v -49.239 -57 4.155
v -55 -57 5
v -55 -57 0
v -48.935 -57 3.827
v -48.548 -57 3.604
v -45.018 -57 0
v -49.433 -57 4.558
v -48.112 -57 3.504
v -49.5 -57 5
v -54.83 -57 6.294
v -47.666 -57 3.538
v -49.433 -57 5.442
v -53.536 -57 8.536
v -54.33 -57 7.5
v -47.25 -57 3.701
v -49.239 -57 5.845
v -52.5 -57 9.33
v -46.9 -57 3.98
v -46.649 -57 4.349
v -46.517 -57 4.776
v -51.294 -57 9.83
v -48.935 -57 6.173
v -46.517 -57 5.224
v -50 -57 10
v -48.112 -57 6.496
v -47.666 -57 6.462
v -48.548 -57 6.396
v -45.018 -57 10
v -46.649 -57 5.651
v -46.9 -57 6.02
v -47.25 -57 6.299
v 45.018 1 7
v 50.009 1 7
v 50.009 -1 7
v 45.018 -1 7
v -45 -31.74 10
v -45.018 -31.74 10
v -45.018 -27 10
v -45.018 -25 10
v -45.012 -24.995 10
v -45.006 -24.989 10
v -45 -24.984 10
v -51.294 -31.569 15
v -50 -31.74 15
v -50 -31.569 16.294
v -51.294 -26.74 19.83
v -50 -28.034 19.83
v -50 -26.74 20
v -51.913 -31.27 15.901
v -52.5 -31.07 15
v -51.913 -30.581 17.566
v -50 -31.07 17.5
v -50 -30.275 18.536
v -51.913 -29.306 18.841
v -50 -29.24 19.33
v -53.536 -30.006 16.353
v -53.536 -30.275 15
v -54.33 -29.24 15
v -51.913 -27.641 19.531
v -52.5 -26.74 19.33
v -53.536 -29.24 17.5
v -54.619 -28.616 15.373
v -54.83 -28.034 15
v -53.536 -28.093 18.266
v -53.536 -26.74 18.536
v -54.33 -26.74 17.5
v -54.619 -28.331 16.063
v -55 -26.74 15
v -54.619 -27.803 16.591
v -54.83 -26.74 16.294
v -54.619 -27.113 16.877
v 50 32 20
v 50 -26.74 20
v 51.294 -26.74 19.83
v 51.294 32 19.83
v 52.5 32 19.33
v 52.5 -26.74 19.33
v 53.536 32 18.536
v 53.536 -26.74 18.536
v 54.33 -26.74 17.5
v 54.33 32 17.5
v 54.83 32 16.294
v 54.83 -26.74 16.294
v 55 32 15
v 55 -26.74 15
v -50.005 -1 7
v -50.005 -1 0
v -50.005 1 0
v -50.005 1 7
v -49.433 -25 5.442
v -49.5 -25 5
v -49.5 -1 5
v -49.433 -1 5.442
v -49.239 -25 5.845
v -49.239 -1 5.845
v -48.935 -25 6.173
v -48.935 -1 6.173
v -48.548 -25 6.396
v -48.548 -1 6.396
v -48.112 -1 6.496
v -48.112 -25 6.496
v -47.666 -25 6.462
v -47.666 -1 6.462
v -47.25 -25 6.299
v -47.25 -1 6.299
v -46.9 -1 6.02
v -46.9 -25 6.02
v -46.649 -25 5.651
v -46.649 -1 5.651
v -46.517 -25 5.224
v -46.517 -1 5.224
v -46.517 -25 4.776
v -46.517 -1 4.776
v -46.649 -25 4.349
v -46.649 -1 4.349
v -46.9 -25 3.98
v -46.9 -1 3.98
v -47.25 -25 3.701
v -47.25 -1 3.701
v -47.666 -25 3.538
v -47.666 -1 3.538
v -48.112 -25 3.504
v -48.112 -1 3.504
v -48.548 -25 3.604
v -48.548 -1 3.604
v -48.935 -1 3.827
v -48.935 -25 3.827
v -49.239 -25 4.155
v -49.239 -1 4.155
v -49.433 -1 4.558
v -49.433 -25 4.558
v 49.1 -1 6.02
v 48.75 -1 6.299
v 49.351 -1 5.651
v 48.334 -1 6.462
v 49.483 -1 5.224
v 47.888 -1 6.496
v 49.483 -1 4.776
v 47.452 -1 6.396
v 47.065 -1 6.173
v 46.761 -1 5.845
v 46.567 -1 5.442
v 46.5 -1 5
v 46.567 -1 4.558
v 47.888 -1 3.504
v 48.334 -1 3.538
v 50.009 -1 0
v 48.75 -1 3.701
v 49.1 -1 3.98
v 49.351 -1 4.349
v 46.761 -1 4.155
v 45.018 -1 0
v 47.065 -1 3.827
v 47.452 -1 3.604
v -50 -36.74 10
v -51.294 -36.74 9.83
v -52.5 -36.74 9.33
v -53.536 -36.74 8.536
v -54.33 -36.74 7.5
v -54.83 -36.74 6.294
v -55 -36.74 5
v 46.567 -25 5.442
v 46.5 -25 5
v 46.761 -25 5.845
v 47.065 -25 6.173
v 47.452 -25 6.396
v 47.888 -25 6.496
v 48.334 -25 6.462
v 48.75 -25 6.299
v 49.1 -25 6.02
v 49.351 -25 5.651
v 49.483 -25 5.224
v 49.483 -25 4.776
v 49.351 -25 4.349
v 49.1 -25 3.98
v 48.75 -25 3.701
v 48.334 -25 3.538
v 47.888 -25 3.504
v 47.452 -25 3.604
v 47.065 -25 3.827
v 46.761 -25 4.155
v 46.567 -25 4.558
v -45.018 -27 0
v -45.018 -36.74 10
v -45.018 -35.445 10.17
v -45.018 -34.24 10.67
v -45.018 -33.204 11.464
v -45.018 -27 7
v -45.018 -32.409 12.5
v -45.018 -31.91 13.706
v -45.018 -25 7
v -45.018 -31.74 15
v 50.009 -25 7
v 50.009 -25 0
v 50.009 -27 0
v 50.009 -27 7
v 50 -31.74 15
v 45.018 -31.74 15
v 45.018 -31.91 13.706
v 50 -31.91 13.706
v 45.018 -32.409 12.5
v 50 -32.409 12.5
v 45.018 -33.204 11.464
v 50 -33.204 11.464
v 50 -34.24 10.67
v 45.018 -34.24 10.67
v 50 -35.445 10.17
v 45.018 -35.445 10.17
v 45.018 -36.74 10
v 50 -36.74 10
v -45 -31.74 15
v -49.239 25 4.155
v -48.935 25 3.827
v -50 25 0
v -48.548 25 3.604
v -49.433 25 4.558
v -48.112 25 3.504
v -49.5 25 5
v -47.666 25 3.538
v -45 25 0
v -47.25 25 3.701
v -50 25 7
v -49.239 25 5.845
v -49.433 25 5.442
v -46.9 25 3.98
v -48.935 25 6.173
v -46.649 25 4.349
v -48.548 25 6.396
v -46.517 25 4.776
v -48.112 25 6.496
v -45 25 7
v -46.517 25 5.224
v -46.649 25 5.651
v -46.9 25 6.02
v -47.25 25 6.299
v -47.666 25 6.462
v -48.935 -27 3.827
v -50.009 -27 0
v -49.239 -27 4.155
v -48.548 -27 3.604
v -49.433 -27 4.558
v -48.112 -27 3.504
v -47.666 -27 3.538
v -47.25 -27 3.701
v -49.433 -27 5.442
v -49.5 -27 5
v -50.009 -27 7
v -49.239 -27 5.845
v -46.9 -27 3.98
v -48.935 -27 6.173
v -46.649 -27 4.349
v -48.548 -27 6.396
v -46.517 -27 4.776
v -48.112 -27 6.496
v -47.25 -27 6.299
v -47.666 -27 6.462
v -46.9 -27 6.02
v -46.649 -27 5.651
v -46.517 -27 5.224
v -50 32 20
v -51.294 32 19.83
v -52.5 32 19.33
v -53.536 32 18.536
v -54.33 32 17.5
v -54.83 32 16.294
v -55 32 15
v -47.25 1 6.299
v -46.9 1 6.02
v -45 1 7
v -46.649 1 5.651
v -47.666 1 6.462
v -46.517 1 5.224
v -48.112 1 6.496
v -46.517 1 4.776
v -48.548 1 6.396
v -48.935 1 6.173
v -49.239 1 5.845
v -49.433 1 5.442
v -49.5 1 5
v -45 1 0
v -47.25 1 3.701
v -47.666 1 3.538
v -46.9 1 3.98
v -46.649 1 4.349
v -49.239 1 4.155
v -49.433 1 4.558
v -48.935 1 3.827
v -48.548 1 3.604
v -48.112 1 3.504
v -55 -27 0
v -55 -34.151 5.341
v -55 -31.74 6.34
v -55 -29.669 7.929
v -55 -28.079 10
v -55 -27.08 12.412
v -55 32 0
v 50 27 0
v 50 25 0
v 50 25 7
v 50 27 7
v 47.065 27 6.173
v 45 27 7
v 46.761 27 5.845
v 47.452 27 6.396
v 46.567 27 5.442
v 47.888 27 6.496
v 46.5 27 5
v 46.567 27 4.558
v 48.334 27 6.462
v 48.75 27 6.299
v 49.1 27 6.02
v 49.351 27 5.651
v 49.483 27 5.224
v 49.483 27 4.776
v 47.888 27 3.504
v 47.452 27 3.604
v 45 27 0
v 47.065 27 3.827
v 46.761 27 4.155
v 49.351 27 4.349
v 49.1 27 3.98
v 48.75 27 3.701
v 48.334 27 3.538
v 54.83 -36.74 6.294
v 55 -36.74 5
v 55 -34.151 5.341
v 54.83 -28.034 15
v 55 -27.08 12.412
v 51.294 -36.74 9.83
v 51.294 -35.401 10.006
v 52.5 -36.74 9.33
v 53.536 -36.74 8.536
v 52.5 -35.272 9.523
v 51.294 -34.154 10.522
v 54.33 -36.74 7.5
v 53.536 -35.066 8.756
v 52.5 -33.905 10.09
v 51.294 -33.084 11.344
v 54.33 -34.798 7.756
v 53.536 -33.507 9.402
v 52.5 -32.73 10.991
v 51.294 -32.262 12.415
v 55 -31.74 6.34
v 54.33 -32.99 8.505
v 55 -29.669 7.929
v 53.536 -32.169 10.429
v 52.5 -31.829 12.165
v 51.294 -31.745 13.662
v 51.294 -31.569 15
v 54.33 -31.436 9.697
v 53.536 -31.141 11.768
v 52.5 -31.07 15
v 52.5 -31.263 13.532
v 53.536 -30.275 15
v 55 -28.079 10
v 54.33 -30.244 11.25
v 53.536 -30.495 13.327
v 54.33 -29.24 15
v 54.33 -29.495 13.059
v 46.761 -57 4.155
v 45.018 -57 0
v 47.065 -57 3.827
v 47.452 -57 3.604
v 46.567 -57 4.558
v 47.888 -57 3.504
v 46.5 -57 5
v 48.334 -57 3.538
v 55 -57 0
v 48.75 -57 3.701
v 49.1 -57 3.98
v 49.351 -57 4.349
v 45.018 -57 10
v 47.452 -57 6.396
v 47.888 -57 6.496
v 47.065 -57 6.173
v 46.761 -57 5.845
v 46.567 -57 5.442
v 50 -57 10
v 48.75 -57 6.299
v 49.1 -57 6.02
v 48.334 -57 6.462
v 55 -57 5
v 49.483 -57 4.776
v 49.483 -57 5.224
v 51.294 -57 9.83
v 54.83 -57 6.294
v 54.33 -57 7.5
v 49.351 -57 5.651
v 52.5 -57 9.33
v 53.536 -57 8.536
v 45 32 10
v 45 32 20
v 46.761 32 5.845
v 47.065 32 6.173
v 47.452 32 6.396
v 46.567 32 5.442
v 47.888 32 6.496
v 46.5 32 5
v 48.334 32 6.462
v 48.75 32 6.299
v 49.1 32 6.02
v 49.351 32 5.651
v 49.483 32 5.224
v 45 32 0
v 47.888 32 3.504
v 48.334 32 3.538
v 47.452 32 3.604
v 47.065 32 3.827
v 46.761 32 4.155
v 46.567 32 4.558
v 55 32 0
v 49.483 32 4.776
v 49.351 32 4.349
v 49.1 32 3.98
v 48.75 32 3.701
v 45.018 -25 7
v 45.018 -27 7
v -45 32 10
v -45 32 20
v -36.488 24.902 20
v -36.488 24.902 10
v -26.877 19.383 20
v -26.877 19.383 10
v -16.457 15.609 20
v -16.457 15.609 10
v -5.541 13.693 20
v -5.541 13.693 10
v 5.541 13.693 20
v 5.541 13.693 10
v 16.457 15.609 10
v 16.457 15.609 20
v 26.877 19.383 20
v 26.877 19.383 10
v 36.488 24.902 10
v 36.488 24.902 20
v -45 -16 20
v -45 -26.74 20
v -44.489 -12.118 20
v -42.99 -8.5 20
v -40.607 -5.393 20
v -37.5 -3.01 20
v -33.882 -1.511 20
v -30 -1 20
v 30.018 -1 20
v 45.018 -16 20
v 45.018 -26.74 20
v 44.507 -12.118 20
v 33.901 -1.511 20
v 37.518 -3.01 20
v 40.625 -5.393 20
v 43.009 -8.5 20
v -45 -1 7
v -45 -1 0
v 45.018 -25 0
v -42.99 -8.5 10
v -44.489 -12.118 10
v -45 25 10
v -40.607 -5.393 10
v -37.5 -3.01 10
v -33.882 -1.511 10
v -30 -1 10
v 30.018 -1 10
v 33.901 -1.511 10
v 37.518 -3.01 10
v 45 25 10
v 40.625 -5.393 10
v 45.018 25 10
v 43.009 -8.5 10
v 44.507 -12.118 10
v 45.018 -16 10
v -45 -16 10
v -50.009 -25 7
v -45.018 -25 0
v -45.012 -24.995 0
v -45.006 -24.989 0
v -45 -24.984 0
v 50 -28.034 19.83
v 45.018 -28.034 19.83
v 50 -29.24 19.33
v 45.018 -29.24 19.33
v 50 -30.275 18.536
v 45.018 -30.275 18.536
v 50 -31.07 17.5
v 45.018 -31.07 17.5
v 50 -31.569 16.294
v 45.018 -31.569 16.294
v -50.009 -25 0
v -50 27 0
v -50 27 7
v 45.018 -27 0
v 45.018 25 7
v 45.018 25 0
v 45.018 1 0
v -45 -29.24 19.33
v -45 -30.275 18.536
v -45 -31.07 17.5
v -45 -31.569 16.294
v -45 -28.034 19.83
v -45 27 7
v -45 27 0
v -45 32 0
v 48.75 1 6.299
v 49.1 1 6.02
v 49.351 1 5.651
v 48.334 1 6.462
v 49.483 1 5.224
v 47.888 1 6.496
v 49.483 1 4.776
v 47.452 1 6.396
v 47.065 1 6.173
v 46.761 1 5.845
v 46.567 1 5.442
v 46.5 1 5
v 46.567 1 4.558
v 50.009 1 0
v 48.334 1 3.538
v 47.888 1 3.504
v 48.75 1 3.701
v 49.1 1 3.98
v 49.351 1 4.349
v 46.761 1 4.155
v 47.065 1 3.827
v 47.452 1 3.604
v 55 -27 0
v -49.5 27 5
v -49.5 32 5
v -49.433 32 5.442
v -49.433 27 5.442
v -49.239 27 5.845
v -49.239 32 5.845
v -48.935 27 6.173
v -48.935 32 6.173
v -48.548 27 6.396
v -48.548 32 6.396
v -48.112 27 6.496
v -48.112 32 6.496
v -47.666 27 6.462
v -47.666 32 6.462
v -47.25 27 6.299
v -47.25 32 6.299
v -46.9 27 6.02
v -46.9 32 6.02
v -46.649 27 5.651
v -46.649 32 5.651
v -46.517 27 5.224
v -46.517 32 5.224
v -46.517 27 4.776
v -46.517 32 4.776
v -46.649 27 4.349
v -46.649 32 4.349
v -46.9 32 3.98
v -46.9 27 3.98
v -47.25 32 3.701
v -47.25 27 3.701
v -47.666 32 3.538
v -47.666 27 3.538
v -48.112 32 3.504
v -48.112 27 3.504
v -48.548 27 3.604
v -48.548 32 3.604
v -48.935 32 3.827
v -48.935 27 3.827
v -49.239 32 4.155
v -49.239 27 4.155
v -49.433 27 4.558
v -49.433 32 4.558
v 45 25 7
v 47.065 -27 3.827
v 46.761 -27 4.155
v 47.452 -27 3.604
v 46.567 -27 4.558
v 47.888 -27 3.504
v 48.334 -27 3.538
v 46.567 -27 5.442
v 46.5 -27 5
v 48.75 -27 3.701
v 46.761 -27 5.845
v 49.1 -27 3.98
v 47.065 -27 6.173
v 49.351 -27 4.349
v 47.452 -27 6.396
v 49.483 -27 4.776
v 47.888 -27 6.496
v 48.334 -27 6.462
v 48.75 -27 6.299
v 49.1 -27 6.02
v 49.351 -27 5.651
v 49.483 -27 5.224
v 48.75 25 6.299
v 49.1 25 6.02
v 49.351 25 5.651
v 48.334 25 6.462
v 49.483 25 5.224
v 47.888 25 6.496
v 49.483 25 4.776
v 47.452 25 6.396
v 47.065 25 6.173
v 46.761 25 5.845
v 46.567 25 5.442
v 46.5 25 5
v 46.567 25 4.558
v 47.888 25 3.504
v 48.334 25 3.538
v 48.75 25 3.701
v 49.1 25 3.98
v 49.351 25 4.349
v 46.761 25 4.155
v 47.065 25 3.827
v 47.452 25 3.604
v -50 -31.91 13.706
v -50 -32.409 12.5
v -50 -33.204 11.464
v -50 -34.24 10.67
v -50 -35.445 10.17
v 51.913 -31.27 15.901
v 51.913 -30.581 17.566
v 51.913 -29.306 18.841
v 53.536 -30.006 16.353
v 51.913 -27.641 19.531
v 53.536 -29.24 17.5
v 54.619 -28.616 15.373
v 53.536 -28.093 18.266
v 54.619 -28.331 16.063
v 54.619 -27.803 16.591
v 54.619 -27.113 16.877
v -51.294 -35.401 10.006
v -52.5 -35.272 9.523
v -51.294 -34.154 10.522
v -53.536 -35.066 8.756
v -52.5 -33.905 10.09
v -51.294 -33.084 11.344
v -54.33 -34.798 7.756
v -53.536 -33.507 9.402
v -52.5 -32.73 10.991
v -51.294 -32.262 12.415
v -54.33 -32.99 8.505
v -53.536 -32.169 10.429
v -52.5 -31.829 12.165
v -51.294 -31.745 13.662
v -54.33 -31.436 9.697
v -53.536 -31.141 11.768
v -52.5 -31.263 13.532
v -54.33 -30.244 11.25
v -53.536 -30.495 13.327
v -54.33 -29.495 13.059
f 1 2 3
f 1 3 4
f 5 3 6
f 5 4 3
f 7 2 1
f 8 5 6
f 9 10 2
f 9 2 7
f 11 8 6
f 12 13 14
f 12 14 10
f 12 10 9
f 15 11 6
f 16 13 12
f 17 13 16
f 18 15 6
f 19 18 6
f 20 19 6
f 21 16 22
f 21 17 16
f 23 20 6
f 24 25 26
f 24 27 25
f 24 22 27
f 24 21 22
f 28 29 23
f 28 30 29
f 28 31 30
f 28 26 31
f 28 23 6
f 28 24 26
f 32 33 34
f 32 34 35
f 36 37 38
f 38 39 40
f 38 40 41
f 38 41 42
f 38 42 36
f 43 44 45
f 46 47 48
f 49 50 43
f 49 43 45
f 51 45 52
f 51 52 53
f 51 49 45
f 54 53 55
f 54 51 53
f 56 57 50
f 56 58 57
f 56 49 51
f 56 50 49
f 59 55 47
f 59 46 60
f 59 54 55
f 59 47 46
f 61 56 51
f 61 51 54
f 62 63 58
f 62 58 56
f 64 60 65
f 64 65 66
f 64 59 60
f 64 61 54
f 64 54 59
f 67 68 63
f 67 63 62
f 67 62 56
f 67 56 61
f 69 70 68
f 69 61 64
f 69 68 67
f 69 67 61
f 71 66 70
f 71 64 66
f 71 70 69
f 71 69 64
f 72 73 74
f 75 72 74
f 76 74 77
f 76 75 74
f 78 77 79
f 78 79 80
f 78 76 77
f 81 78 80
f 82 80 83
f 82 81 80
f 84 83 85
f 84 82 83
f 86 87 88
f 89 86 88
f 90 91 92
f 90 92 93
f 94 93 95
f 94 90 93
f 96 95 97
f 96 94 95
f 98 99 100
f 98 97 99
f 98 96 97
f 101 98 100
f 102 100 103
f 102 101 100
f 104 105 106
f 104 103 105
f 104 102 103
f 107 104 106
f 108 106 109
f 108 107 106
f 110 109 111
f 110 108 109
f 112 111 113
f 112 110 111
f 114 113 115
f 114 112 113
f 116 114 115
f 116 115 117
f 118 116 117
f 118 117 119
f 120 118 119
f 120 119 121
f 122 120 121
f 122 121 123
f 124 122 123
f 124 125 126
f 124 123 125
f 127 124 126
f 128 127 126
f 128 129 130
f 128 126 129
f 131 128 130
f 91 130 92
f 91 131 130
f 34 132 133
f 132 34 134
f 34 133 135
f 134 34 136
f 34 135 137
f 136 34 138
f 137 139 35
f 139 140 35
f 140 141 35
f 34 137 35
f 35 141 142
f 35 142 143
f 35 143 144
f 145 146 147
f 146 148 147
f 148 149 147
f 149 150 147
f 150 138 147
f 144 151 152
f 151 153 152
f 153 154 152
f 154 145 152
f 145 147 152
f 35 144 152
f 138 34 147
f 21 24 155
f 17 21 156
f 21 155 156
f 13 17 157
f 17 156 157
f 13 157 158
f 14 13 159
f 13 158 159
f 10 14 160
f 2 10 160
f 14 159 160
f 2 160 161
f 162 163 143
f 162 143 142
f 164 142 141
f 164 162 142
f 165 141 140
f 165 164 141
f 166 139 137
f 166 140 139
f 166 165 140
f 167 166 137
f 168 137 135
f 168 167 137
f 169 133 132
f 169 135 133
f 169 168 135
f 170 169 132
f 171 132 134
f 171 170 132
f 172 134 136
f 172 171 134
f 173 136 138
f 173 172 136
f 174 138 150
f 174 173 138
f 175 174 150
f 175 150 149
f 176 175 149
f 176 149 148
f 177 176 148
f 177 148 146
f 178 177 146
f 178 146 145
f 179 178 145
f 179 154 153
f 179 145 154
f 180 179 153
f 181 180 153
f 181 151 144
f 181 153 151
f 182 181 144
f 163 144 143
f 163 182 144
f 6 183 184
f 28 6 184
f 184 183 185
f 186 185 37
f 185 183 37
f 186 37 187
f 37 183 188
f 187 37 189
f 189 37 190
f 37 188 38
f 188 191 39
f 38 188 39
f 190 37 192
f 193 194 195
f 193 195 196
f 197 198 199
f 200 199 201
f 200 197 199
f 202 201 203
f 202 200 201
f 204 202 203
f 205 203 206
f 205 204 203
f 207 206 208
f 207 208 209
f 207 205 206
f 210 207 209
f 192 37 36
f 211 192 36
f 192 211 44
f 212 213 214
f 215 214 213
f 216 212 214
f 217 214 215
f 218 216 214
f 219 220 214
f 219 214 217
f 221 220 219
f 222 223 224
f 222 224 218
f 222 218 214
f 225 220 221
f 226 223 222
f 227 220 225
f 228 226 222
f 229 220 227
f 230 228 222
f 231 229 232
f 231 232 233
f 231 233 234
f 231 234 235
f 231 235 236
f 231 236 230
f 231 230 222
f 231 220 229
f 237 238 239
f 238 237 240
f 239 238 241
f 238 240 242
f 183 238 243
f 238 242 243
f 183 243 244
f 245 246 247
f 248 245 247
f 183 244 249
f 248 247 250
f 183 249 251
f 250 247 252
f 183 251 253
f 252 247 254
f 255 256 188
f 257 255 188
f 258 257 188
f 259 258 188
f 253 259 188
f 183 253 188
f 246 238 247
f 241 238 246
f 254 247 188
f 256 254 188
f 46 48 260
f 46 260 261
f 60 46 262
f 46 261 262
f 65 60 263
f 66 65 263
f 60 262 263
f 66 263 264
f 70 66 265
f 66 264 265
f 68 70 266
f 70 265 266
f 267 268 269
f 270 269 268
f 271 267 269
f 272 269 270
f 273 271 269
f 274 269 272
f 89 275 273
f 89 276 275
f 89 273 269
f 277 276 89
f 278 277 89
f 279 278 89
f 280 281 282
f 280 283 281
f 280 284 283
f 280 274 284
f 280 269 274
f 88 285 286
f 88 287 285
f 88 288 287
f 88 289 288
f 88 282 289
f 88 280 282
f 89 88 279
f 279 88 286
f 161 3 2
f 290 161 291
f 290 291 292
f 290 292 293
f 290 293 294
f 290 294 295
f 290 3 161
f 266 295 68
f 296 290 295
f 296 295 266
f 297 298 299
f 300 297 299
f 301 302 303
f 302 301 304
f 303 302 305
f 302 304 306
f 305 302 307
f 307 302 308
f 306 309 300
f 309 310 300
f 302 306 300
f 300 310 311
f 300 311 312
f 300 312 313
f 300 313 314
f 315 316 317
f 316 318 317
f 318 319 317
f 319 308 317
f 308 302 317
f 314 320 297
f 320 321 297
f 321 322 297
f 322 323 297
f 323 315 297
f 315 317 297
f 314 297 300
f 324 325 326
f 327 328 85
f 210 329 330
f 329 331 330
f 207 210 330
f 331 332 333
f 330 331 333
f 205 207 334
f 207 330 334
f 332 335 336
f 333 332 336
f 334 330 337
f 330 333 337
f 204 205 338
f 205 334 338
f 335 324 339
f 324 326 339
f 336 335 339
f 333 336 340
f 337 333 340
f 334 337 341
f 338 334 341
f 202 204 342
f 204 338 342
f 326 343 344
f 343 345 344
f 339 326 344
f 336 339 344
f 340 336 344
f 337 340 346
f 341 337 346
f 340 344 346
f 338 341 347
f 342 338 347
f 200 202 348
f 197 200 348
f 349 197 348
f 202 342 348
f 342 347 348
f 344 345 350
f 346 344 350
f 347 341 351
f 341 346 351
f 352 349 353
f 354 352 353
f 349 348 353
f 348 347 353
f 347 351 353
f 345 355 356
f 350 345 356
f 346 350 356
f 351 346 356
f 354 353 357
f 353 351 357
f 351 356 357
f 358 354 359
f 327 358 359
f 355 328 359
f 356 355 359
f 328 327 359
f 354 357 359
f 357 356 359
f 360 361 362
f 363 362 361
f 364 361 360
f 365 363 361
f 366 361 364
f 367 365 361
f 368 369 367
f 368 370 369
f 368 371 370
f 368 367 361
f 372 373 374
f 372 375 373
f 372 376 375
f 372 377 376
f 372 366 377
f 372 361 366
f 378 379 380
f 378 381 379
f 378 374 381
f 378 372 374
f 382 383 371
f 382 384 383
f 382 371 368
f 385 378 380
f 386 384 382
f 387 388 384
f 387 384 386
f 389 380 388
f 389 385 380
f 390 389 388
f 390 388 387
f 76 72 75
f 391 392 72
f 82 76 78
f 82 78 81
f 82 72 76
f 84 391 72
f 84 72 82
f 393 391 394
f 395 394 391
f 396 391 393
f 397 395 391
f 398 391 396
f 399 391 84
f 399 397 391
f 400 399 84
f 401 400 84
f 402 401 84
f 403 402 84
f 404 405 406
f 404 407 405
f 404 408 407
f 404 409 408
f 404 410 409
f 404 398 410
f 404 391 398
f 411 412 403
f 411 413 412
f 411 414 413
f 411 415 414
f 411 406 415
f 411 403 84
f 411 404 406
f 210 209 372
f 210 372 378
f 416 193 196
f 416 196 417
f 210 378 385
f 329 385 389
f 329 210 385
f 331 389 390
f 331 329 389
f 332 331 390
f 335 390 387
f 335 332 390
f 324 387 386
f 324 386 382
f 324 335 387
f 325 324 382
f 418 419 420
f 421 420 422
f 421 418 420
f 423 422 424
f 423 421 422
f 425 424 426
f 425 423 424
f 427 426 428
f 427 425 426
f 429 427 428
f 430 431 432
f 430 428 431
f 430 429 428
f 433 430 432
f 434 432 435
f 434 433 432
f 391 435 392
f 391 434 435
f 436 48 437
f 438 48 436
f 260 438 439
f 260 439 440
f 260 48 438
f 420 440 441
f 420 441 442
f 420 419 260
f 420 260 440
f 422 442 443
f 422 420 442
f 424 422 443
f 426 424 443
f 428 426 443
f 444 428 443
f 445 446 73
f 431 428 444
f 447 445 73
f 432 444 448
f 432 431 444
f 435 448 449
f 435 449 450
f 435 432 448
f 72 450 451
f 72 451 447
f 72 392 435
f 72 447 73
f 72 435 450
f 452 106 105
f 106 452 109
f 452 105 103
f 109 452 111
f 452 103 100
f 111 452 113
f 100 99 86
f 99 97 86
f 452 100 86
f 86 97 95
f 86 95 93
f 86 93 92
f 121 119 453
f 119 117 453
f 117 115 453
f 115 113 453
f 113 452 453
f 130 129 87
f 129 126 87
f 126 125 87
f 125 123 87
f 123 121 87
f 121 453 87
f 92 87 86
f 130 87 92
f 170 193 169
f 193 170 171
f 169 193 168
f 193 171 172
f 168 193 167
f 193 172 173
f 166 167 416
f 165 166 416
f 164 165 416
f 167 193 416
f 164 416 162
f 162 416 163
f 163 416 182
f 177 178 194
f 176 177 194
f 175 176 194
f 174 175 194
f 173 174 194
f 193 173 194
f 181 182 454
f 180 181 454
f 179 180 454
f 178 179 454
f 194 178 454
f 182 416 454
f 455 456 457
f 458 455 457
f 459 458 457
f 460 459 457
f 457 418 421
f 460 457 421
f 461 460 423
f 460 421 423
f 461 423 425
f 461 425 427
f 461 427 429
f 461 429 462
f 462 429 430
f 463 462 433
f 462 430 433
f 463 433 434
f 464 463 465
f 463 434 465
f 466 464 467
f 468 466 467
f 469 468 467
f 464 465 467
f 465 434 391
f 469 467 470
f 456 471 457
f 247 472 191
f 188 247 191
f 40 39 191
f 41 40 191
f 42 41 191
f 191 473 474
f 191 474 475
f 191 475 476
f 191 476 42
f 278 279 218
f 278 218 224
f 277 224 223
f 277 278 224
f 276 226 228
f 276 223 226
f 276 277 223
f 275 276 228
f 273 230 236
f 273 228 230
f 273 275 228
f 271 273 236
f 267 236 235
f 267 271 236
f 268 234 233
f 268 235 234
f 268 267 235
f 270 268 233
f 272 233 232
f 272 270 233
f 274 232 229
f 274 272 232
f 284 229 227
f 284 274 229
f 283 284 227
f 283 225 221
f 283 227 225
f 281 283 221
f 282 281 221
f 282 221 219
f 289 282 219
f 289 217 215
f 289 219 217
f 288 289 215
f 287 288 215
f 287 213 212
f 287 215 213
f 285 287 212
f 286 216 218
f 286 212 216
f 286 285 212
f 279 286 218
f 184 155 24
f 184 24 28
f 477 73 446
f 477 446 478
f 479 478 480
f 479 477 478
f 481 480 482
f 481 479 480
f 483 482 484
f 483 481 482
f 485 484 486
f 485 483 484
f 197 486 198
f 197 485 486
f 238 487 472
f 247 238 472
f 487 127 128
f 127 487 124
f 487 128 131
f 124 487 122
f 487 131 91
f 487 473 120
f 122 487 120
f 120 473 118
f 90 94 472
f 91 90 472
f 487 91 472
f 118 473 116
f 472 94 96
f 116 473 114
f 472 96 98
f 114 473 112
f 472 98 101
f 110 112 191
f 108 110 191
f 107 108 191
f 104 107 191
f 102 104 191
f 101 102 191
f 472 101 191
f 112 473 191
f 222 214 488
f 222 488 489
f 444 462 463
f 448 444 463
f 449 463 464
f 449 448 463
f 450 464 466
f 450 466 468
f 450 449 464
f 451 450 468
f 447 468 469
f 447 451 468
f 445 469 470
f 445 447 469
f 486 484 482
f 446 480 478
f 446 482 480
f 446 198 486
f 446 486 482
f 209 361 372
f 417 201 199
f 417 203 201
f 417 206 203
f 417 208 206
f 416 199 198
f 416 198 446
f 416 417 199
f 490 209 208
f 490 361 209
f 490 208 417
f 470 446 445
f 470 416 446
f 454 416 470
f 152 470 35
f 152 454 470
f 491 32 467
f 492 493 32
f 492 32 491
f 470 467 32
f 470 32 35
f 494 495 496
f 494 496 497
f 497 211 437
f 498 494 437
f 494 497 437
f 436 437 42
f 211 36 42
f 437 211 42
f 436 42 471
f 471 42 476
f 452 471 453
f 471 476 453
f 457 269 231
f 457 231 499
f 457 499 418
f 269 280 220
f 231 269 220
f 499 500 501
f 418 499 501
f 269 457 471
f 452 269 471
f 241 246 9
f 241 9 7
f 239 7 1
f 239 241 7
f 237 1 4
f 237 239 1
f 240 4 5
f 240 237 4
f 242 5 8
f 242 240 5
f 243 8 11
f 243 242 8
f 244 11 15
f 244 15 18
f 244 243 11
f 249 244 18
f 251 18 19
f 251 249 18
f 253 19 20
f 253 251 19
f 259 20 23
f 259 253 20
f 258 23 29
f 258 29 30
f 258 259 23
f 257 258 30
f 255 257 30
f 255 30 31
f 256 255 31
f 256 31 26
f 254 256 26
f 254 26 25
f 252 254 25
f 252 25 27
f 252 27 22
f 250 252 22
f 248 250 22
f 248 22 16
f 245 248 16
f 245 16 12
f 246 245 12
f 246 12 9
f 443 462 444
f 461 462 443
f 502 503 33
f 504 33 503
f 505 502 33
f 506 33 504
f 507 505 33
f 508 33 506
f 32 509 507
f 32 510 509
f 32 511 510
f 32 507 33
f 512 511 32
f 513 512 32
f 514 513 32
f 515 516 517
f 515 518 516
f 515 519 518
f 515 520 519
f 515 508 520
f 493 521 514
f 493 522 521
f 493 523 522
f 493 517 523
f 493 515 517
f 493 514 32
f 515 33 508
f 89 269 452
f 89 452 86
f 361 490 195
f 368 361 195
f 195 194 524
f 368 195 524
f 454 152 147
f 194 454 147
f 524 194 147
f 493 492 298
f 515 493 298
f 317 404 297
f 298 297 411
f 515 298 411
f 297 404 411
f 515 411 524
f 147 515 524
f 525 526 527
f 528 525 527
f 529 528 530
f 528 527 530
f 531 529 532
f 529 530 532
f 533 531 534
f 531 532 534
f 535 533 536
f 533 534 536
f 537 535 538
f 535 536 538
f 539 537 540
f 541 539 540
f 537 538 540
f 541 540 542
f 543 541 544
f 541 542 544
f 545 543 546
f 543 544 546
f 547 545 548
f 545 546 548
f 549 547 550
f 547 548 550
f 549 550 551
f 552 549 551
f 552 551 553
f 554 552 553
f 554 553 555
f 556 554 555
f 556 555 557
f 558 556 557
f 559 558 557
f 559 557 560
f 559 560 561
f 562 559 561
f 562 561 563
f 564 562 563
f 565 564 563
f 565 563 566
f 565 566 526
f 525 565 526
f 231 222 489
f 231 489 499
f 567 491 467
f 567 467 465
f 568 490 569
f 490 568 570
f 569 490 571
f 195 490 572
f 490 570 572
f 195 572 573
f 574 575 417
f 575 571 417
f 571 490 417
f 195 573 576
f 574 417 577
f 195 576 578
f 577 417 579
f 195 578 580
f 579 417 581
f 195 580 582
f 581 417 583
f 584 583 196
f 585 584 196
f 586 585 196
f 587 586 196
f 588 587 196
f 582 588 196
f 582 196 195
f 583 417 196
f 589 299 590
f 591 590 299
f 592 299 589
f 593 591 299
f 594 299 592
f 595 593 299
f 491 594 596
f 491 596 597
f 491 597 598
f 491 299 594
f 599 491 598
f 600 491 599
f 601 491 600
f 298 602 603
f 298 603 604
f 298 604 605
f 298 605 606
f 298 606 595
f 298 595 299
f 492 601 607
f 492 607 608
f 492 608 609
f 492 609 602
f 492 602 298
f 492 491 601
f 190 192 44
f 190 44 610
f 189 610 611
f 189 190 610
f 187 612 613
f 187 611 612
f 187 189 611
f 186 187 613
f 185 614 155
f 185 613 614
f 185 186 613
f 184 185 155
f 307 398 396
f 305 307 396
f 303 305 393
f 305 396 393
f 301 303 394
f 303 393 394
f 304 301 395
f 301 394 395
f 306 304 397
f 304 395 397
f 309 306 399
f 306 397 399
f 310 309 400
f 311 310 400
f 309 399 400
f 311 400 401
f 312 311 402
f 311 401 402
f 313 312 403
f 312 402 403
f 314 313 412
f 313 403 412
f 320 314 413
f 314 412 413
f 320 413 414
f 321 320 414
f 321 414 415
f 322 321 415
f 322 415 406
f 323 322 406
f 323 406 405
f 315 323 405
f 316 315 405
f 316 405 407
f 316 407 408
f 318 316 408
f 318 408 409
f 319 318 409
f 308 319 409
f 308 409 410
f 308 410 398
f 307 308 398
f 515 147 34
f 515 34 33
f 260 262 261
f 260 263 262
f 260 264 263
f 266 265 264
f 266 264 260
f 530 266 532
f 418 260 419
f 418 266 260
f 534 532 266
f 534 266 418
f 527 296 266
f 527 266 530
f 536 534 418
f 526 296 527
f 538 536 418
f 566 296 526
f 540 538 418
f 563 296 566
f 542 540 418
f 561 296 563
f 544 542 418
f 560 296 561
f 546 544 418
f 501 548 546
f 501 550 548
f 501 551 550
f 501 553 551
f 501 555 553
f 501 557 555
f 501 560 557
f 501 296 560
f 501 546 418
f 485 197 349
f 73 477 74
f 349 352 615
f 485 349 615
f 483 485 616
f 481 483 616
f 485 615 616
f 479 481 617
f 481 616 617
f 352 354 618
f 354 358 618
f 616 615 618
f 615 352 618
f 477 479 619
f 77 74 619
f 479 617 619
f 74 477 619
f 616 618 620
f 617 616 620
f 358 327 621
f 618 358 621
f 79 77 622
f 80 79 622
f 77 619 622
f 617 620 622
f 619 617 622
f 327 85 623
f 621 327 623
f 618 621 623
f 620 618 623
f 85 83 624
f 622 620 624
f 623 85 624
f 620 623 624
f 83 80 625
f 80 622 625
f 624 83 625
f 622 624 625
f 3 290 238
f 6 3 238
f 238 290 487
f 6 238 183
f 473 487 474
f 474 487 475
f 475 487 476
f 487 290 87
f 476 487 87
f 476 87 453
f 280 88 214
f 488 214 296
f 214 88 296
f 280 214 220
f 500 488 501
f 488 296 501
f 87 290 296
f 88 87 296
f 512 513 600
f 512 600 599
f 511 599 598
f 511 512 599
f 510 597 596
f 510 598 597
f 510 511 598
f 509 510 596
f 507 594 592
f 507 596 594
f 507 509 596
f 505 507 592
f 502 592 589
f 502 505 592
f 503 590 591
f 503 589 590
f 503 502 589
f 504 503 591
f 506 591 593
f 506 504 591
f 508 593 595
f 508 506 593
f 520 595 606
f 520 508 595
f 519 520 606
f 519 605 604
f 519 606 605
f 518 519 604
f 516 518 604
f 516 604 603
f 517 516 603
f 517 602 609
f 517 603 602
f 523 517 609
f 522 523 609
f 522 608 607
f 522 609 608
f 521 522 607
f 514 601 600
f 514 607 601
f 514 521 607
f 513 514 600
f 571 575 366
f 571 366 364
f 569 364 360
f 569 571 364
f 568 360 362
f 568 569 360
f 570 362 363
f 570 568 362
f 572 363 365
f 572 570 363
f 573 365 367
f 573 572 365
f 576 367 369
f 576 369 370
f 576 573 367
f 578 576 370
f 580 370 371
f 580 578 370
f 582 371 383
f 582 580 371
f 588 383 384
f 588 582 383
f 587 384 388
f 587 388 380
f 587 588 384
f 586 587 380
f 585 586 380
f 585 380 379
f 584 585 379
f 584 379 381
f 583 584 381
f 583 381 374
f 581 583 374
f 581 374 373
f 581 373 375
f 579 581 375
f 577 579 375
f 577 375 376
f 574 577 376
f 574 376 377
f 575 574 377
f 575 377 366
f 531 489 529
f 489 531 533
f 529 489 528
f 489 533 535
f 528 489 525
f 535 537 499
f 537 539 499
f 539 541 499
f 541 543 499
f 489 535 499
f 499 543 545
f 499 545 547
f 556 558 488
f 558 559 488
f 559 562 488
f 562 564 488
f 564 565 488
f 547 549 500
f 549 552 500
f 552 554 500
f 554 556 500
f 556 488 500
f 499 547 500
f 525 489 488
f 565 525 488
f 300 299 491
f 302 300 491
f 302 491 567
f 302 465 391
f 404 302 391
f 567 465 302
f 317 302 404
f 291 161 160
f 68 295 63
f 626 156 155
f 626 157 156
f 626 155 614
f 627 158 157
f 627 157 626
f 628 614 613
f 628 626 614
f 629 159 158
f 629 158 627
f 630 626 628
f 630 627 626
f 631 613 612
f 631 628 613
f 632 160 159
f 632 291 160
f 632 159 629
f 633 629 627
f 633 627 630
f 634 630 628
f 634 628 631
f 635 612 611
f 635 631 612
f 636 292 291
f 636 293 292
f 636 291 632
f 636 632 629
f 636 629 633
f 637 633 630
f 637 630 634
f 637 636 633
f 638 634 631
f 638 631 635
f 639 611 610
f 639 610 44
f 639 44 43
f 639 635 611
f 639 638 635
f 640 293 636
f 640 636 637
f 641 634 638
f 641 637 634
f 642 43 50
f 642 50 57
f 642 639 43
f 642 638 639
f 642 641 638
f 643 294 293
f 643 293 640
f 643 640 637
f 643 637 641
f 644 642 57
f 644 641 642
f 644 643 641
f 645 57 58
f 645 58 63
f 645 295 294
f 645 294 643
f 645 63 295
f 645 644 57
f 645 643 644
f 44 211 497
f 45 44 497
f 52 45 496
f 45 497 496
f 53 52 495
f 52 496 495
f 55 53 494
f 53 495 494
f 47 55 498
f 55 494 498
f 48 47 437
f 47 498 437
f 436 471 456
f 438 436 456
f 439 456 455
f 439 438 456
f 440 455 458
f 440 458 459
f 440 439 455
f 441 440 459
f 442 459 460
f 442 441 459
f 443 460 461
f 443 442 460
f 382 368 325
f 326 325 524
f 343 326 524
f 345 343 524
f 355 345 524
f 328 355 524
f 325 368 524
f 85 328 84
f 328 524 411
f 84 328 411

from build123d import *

# Parameters (mm, degrees)
BOSS_EXTRUDE1_DEPTH     = 10
CUT_EXTRUDE1_DEPTH      = 72.414284285
CUT_EXTRUDE1_DEPTH_BACK = 72.414284285
SKETCH2_R               = 1.5
SKETCH9_W               = 10
SKETCH9_H               = 50
BOSS_EXTRUDE9_DEPTH     = 5
SKETCH10_W              = 10
SKETCH10_H              = 50
BOSS_EXTRUDE10_DEPTH    = 5
BOSS_EXTRUDE11_DEPTH    = 2
SKETCH12_W              = 10
SKETCH12_H              = 10
BOSS_EXTRUDE12_DEPTH    = 5
CUT_EXTRUDE2_START      = 7
SKETCH13_R              = 1.5
CUT_EXTRUDE2_DEPTH      = 7
BOSS_EXTRUDE13_DEPTH    = 2
SKETCH15_W              = 9.981523119
SKETCH15_H              = 10
BOSS_EXTRUDE14_DEPTH    = 30
SKETCH16_R              = 1.5
CUT_EXTRUDE3_DEPTH      = 32
SKETCH17_W              = 110
SKETCH17_H              = 63.73964009
BOSS_EXTRUDE15_DEPTH    = 10
CUT_EXTRUDE4_REACH      = 83.695
SKETCH18_W              = 100.013857661
SKETCH18_H              = 2
SKETCH19_W              = 90.018476881
SKETCH19_H              = 50
CUT_EXTRUDE5_DEPTH      = 10
CUT_EXTRUDE6_DEPTH      = 80.837334625
SKETCH21_W              = 90.018476881
SKETCH21_H              = 30.73964009
CUT_EXTRUDE7_DEPTH      = 80.837334625
FILLET1_R               = 5
FILLET2_R               = 15
FILLET3_R               = 5


with BuildPart() as part:
    # Sketch1 → Boss-Extrude1 (new body)
    with BuildSketch(Plane.XY):
        with BuildLine():
            Line((45.018476881, -25), (50, -25))
            Line((50, -25), (50, 25))
            Line((50, 25), (45, 25))
            ThreePointArc((45, 25), (0, 8), (-45, 25))
            Line((-45, 25), (-50, 25))
            Line((-50, 25), (-50, -25))
            Line((-50, -25), (-45.018476881, -25))
            ThreePointArc((-45.018476881, -25), (0, -8), (45.018476881, -25))
        make_face()
    extrude(amount=BOSS_EXTRUDE1_DEPTH)

    # Sketch2 → Cut-Extrude1 (cut, two sides: drawn at the far end of the back side and taken through both)
    with BuildSketch(Plane(origin=(0, 25, 0), x_dir=(1, 0, 0), z_dir=(0, 1, 0)).offset(-CUT_EXTRUDE1_DEPTH_BACK)):
        with Locations(Location((-48, -5, 0), (0, 0, 180))):
            Circle(SKETCH2_R)
        with Locations(Location((48, -5, 0), (0, 0, 180))):
            Circle(SKETCH2_R)
    extrude(amount=CUT_EXTRUDE1_DEPTH + CUT_EXTRUDE1_DEPTH_BACK, mode=Mode.SUBTRACT)

    # Sketch9 → Boss-Extrude9 (add)
    with BuildSketch(Plane(origin=(50, 0, 0), x_dir=(0, 0, -1), z_dir=(1, 0, 0))):
        with Locations((-5, 0)):
            Rectangle(SKETCH9_W, SKETCH9_H)
    extrude(amount=BOSS_EXTRUDE9_DEPTH)

    # Sketch10 → Boss-Extrude10 (add)
    with BuildSketch(Plane.ZY.offset(50)):
        with Locations((5, 0)):
            Rectangle(SKETCH10_W, SKETCH10_H)
    extrude(amount=BOSS_EXTRUDE10_DEPTH)

    # Sketch11 → Boss-Extrude11 (add)
    with BuildSketch(Plane(origin=(0, 25, 0), x_dir=(1, 0, 0), z_dir=(0, 1, 0))):
        Polygon((50, 0), (50, -7), (45, -7), (45, -10), (55, -10), (55, 0), align=None)
        Polygon((-50, 0), (-50, -7), (-45, -7), (-45, -10), (-55, -10), (-55, 0), align=None)
    extrude(amount=BOSS_EXTRUDE11_DEPTH)

    # Sketch12 → Boss-Extrude12 (add)
    with BuildSketch(Plane(origin=(0, 27, 0), x_dir=(1, 0, 0), z_dir=(0, 1, 0))):
        with Locations((50, -5)):
            Rectangle(SKETCH12_W, SKETCH12_H)
        with Locations((-50, -5)):
            Rectangle(SKETCH12_W, SKETCH12_H)
    extrude(amount=BOSS_EXTRUDE12_DEPTH)

    # Sketch13 → Cut-Extrude2 (cut)
    with BuildSketch(Plane(origin=(0, 25, 0), x_dir=(1, 0, 0), z_dir=(0, 1, 0)).offset(CUT_EXTRUDE2_START)):
        with Locations(Location((48, -5, 0), (0, 0, 180))):
            Circle(SKETCH13_R)
        with Locations(Location((-48, -5, 0), (0, 0, 180))):
            Circle(SKETCH13_R)
    extrude(amount=-CUT_EXTRUDE2_DEPTH, mode=Mode.SUBTRACT)

    # Sketch14 → Boss-Extrude13 (add)
    with BuildSketch(Plane.XZ.offset(25)):
        Polygon((50.009238441, 0), (50.009238441, 7), (45.018476881, 7), (45.018476881, 10), (55, 10), (55, 0), align=None)
        Polygon((-50.009238441, 0), (-50.009238441, 7), (-45.018476881, 7), (-45.018476881, 10), (-55, 10), (-55, 0), align=None)
    extrude(amount=BOSS_EXTRUDE13_DEPTH)

    # Sketch15 → Boss-Extrude14 (add)
    with BuildSketch(Plane.XZ.offset(27)):
        with Locations((-50.00923844, 5)):
            Rectangle(SKETCH15_W, SKETCH15_H)
        with Locations((50.00923844, 5)):
            Rectangle(SKETCH15_W, SKETCH15_H)
    extrude(amount=BOSS_EXTRUDE14_DEPTH)

    # Sketch16 → Cut-Extrude3 (cut)
    with BuildSketch(Plane.XZ.offset(25)):
        with Locations(Location((48, 5, 0), (0, 0, 180))):
            Circle(SKETCH16_R)
        with Locations(Location((-48, 5, 0), (0, 0, 180))):
            Circle(SKETCH16_R)
    extrude(amount=CUT_EXTRUDE3_DEPTH, mode=Mode.SUBTRACT)

    # Sketch17 → Boss-Extrude15 (add)
    with BuildSketch(Plane.XY.offset(10)):
        with Locations((0, 0.130179955)):
            Rectangle(SKETCH17_W, SKETCH17_H)
    extrude(amount=BOSS_EXTRUDE15_DEPTH)

    # Cut-Extrude4: up to this face of the body (flat: up to its plane)
    cut_extrude4_end = Plane(part.part.faces().sort_by_distance((47.5, 26, 7))[0])
    # Sketch18 → Cut-Extrude4 (cut, up to the picked face)
    with BuildSketch(Plane(origin=(0, 0, 0), x_dir=(-1, 0, 0), z_dir=(0, 0, -1)), mode=Mode.PRIVATE) as cut_extrude4_sk1:
        with Locations((-0.00230961, 0)):
            Rectangle(SKETCH18_W, SKETCH18_H)
    cut_extrude4_tool1 = split(extrude(cut_extrude4_sk1.sketch, amount=-CUT_EXTRUDE4_REACH, mode=Mode.PRIVATE), bisect_by=cut_extrude4_end, keep=Keep.BOTH, mode=Mode.PRIVATE)
    add(cut_extrude4_tool1.solids().sort_by(Axis((0.00231, 0, 0), (0, 0, 1)))[0], mode=Mode.SUBTRACT)

    # Sketch19 → Cut-Extrude5 (cut)
    with BuildSketch(Plane(origin=(0, 0, 0), x_dir=(-1, 0, 0), z_dir=(0, 0, -1))):
        with Locations((-0.009238441, 0)):
            Rectangle(SKETCH19_W, SKETCH19_H)
    extrude(amount=-CUT_EXTRUDE5_DEPTH, mode=Mode.SUBTRACT)

    # Sketch20 → Cut-Extrude6 (cut, through all)
    with BuildSketch(Plane(origin=(0, 0, 10), x_dir=(-1, 0, 0), z_dir=(0, 0, -1))):
        with BuildLine():
            Line((-45, 32), (45, 32))
            ThreePointArc((45, 32), (0, 13.452072887), (-45, 32))
        make_face()
    extrude(amount=-CUT_EXTRUDE6_DEPTH, mode=Mode.SUBTRACT)

    # Sketch21 → Cut-Extrude7 (cut, through all)
    with BuildSketch(Plane(origin=(0, 0, 10), x_dir=(-1, 0, 0), z_dir=(0, 0, -1))):
        with Locations((-0.009238441, -16.369820045)):
            Rectangle(SKETCH21_W, SKETCH21_H)
    extrude(amount=-CUT_EXTRUDE7_DEPTH, mode=Mode.SUBTRACT)

    # Fillet1
    fillet1_edges = [part.edges().sort_by_distance(p)[0] for p in [
        (50.009238441, -31.73964009, 20),
        (50.009238441, -31.73964009, 10),
        (-50, -31.73964009, 20),
        (-50.009238441, -31.73964009, 10),
    ]]
    fillet(fillet1_edges, radius=FILLET1_R - 0.0001)  # a hair under: the kernel refuses the full size

    # Fillet2
    fillet2_edges = [part.edges().sort_by_distance(p)[0] for p in [
        (45.018476881, -1, 15),
        (-45, -1, 15),
    ]]
    fillet(fillet2_edges, radius=FILLET2_R)

    # Fillet3
    fillet3_edges = [part.edges().sort_by_distance(p)[0] for p in [
        (-55, 2.630129955, 20),
        (55, 2.630129955, 20),
        (55, -46.869770045, 10),
        (55, -30.275203285, 18.535563195),
        (-55, -30.275203285, 18.535563195),
        (55, -33.204076895, 11.464436805),
        (-55, -33.204076895, 11.464436805),
        (-55, -46.869770045, 10),
    ]]
    fillet(fillet3_edges, radius=FILLET3_R - 0.0001)  # a hair under: the kernel refuses the full size


solid = part.part
